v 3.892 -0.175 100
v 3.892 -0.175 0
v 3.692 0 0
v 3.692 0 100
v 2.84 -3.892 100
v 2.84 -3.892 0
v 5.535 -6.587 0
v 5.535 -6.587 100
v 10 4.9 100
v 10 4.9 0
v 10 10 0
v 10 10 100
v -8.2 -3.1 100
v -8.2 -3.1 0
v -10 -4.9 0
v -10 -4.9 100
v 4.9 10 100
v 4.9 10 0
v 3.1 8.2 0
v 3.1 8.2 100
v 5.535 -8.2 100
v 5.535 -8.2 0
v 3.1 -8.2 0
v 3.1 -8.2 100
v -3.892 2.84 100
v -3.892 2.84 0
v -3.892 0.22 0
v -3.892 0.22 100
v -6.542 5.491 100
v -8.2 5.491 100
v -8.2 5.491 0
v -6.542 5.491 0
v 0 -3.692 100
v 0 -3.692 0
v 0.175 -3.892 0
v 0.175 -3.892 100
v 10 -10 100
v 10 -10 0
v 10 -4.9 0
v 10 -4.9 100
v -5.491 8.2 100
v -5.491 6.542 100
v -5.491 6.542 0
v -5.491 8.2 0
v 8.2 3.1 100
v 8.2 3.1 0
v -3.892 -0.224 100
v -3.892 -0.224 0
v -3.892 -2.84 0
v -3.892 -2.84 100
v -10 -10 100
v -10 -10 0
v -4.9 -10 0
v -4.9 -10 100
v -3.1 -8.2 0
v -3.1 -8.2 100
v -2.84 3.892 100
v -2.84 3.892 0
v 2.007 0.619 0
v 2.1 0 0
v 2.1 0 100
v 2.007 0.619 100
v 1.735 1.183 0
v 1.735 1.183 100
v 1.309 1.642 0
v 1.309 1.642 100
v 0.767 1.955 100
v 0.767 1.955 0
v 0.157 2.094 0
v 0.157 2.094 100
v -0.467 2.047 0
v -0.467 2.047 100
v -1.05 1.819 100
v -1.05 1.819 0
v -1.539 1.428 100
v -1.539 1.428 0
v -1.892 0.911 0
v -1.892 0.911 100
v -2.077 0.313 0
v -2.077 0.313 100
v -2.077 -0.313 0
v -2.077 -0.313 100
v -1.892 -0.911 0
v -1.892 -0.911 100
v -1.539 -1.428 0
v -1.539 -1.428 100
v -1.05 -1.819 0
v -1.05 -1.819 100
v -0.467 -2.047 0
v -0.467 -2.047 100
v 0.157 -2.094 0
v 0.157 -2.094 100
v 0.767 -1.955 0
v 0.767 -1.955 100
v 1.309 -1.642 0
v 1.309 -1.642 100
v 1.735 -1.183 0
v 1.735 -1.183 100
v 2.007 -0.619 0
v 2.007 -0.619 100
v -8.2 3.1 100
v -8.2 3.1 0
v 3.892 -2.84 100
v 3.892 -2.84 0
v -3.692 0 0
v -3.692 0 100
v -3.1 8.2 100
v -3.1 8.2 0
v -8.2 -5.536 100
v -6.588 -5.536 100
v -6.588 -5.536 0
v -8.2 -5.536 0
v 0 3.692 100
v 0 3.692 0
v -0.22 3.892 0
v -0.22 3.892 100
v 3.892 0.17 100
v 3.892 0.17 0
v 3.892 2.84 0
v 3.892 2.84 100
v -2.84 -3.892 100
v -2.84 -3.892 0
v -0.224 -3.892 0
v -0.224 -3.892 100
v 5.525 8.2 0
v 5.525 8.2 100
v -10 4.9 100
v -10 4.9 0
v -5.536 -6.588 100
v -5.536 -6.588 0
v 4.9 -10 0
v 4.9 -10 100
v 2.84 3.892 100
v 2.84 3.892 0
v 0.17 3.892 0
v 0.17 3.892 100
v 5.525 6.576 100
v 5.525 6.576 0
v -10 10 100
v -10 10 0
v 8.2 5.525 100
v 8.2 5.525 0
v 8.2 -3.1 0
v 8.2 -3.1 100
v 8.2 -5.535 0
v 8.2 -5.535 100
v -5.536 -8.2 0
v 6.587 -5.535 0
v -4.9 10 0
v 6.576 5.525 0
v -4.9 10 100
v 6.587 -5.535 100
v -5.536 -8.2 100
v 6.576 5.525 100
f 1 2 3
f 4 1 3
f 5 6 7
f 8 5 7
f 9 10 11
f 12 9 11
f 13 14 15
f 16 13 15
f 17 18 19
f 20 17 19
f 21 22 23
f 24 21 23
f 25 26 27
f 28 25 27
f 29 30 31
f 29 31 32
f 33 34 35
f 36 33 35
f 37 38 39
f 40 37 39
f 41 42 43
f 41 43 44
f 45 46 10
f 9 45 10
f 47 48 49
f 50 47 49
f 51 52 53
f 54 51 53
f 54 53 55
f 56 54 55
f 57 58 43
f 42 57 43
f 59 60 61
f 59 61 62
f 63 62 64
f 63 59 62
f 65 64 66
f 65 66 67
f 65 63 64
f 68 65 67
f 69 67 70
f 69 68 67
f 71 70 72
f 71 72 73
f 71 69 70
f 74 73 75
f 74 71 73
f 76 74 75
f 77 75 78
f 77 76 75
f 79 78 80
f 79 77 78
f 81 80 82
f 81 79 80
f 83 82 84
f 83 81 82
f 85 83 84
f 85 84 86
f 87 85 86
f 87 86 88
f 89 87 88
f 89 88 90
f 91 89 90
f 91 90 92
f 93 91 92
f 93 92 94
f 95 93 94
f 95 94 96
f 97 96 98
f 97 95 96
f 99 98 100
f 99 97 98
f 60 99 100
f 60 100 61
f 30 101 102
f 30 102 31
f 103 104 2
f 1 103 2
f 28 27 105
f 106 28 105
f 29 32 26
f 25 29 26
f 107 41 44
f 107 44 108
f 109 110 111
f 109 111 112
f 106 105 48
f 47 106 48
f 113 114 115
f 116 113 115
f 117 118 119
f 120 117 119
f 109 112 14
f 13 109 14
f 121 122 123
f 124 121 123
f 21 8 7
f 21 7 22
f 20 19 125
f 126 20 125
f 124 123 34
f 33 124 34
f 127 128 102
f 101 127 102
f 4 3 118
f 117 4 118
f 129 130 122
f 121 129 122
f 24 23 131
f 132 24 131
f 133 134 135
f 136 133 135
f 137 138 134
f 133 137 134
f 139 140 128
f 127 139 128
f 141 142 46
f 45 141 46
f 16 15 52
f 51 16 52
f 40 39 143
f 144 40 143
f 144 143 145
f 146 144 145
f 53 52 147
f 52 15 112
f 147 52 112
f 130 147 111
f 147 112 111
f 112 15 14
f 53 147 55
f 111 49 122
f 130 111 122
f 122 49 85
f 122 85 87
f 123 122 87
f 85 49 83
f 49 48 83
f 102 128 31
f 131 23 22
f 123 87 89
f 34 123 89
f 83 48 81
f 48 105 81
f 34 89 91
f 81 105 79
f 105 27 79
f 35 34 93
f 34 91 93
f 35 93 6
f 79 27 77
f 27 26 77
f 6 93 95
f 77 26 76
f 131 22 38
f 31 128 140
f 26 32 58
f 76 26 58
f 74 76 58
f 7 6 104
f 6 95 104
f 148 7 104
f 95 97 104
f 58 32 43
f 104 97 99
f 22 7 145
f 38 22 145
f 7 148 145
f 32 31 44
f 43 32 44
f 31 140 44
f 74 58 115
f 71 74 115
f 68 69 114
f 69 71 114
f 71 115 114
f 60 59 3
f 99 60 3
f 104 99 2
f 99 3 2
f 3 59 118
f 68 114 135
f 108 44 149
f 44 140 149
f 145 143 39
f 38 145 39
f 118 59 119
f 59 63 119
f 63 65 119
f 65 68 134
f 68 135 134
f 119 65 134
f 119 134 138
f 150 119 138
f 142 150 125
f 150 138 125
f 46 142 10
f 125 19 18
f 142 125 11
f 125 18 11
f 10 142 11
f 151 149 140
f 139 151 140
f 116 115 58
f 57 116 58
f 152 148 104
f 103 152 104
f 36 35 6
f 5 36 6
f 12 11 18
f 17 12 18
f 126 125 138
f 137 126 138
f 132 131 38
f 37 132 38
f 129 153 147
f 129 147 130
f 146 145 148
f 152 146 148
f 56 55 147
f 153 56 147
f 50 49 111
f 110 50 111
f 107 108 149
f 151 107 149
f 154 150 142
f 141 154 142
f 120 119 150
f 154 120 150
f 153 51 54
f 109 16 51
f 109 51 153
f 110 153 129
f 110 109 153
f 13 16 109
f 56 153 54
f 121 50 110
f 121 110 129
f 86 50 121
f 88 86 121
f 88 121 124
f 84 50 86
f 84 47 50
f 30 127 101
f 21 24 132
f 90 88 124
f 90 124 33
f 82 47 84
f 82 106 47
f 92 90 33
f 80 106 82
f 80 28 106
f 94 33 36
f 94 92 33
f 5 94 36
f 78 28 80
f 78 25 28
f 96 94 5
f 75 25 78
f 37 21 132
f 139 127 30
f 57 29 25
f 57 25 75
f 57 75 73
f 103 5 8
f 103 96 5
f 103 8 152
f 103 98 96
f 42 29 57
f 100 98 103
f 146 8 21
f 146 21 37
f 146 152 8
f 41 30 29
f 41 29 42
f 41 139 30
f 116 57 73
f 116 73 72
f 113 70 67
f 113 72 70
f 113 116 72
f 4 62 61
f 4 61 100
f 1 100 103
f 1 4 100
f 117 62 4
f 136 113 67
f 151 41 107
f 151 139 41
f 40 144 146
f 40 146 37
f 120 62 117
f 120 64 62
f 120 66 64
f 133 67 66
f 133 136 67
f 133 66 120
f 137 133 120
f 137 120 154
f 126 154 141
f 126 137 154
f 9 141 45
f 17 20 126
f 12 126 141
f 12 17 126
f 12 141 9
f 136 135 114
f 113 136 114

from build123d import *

# Parameters (mm, degrees)
SKETCH_R  = 2.1
PAD_DEPTH = 100


with BuildPart() as part:
    # Sketch → Pad (new body)
    with BuildSketch(Plane.XY):
        Polygon((0, -3.691567), (0.174924, -3.891567), (2.84, -3.891567), (5.535042, -6.586609), (5.535042, -8.2), (3.1, -8.2), (4.9, -10), (10, -10), (10, -4.9), (8.2, -3.1), (8.2, -5.535042), (6.586609, -5.535042), (3.891567, -2.84), (3.891567, -0.174924), (3.691567, 0), (3.891567, 0.170281), (3.891567, 2.84), (6.576242, 5.524674), (8.2, 5.524674), (8.2, 3.1), (10, 4.9), (10, 10), (4.9, 10), (3.1, 8.2), (5.524674, 8.2), (5.524674, 6.576242), (2.84, 3.891567), (0.170281, 3.891567), (0, 3.691567), (-0.219864, 3.891567), (-2.84, 3.891567), (-5.490619, 6.542187), (-5.490619, 8.2), (-3.1, 8.2), (-4.9, 10), (-10, 10), (-10, 4.9), (-8.2, 3.1), (-8.2, 5.490619), (-6.542187, 5.490619), (-3.891567, 2.84), (-3.891567, 0.219864), (-3.691567, 0), (-3.891567, -0.224285), (-3.891567, -2.84), (-6.587748, -5.53618), (-8.2, -5.53618), (-8.2, -3.1), (-10, -4.9), (-10, -10), (-4.9, -10), (-3.1, -8.2), (-5.53618, -8.2), (-5.53618, -6.587748), (-2.84, -3.891567), (-0.224285, -3.891567), align=None)
        Circle(SKETCH_R, mode=Mode.SUBTRACT)
    extrude(amount=PAD_DEPTH)


solid = part.part
